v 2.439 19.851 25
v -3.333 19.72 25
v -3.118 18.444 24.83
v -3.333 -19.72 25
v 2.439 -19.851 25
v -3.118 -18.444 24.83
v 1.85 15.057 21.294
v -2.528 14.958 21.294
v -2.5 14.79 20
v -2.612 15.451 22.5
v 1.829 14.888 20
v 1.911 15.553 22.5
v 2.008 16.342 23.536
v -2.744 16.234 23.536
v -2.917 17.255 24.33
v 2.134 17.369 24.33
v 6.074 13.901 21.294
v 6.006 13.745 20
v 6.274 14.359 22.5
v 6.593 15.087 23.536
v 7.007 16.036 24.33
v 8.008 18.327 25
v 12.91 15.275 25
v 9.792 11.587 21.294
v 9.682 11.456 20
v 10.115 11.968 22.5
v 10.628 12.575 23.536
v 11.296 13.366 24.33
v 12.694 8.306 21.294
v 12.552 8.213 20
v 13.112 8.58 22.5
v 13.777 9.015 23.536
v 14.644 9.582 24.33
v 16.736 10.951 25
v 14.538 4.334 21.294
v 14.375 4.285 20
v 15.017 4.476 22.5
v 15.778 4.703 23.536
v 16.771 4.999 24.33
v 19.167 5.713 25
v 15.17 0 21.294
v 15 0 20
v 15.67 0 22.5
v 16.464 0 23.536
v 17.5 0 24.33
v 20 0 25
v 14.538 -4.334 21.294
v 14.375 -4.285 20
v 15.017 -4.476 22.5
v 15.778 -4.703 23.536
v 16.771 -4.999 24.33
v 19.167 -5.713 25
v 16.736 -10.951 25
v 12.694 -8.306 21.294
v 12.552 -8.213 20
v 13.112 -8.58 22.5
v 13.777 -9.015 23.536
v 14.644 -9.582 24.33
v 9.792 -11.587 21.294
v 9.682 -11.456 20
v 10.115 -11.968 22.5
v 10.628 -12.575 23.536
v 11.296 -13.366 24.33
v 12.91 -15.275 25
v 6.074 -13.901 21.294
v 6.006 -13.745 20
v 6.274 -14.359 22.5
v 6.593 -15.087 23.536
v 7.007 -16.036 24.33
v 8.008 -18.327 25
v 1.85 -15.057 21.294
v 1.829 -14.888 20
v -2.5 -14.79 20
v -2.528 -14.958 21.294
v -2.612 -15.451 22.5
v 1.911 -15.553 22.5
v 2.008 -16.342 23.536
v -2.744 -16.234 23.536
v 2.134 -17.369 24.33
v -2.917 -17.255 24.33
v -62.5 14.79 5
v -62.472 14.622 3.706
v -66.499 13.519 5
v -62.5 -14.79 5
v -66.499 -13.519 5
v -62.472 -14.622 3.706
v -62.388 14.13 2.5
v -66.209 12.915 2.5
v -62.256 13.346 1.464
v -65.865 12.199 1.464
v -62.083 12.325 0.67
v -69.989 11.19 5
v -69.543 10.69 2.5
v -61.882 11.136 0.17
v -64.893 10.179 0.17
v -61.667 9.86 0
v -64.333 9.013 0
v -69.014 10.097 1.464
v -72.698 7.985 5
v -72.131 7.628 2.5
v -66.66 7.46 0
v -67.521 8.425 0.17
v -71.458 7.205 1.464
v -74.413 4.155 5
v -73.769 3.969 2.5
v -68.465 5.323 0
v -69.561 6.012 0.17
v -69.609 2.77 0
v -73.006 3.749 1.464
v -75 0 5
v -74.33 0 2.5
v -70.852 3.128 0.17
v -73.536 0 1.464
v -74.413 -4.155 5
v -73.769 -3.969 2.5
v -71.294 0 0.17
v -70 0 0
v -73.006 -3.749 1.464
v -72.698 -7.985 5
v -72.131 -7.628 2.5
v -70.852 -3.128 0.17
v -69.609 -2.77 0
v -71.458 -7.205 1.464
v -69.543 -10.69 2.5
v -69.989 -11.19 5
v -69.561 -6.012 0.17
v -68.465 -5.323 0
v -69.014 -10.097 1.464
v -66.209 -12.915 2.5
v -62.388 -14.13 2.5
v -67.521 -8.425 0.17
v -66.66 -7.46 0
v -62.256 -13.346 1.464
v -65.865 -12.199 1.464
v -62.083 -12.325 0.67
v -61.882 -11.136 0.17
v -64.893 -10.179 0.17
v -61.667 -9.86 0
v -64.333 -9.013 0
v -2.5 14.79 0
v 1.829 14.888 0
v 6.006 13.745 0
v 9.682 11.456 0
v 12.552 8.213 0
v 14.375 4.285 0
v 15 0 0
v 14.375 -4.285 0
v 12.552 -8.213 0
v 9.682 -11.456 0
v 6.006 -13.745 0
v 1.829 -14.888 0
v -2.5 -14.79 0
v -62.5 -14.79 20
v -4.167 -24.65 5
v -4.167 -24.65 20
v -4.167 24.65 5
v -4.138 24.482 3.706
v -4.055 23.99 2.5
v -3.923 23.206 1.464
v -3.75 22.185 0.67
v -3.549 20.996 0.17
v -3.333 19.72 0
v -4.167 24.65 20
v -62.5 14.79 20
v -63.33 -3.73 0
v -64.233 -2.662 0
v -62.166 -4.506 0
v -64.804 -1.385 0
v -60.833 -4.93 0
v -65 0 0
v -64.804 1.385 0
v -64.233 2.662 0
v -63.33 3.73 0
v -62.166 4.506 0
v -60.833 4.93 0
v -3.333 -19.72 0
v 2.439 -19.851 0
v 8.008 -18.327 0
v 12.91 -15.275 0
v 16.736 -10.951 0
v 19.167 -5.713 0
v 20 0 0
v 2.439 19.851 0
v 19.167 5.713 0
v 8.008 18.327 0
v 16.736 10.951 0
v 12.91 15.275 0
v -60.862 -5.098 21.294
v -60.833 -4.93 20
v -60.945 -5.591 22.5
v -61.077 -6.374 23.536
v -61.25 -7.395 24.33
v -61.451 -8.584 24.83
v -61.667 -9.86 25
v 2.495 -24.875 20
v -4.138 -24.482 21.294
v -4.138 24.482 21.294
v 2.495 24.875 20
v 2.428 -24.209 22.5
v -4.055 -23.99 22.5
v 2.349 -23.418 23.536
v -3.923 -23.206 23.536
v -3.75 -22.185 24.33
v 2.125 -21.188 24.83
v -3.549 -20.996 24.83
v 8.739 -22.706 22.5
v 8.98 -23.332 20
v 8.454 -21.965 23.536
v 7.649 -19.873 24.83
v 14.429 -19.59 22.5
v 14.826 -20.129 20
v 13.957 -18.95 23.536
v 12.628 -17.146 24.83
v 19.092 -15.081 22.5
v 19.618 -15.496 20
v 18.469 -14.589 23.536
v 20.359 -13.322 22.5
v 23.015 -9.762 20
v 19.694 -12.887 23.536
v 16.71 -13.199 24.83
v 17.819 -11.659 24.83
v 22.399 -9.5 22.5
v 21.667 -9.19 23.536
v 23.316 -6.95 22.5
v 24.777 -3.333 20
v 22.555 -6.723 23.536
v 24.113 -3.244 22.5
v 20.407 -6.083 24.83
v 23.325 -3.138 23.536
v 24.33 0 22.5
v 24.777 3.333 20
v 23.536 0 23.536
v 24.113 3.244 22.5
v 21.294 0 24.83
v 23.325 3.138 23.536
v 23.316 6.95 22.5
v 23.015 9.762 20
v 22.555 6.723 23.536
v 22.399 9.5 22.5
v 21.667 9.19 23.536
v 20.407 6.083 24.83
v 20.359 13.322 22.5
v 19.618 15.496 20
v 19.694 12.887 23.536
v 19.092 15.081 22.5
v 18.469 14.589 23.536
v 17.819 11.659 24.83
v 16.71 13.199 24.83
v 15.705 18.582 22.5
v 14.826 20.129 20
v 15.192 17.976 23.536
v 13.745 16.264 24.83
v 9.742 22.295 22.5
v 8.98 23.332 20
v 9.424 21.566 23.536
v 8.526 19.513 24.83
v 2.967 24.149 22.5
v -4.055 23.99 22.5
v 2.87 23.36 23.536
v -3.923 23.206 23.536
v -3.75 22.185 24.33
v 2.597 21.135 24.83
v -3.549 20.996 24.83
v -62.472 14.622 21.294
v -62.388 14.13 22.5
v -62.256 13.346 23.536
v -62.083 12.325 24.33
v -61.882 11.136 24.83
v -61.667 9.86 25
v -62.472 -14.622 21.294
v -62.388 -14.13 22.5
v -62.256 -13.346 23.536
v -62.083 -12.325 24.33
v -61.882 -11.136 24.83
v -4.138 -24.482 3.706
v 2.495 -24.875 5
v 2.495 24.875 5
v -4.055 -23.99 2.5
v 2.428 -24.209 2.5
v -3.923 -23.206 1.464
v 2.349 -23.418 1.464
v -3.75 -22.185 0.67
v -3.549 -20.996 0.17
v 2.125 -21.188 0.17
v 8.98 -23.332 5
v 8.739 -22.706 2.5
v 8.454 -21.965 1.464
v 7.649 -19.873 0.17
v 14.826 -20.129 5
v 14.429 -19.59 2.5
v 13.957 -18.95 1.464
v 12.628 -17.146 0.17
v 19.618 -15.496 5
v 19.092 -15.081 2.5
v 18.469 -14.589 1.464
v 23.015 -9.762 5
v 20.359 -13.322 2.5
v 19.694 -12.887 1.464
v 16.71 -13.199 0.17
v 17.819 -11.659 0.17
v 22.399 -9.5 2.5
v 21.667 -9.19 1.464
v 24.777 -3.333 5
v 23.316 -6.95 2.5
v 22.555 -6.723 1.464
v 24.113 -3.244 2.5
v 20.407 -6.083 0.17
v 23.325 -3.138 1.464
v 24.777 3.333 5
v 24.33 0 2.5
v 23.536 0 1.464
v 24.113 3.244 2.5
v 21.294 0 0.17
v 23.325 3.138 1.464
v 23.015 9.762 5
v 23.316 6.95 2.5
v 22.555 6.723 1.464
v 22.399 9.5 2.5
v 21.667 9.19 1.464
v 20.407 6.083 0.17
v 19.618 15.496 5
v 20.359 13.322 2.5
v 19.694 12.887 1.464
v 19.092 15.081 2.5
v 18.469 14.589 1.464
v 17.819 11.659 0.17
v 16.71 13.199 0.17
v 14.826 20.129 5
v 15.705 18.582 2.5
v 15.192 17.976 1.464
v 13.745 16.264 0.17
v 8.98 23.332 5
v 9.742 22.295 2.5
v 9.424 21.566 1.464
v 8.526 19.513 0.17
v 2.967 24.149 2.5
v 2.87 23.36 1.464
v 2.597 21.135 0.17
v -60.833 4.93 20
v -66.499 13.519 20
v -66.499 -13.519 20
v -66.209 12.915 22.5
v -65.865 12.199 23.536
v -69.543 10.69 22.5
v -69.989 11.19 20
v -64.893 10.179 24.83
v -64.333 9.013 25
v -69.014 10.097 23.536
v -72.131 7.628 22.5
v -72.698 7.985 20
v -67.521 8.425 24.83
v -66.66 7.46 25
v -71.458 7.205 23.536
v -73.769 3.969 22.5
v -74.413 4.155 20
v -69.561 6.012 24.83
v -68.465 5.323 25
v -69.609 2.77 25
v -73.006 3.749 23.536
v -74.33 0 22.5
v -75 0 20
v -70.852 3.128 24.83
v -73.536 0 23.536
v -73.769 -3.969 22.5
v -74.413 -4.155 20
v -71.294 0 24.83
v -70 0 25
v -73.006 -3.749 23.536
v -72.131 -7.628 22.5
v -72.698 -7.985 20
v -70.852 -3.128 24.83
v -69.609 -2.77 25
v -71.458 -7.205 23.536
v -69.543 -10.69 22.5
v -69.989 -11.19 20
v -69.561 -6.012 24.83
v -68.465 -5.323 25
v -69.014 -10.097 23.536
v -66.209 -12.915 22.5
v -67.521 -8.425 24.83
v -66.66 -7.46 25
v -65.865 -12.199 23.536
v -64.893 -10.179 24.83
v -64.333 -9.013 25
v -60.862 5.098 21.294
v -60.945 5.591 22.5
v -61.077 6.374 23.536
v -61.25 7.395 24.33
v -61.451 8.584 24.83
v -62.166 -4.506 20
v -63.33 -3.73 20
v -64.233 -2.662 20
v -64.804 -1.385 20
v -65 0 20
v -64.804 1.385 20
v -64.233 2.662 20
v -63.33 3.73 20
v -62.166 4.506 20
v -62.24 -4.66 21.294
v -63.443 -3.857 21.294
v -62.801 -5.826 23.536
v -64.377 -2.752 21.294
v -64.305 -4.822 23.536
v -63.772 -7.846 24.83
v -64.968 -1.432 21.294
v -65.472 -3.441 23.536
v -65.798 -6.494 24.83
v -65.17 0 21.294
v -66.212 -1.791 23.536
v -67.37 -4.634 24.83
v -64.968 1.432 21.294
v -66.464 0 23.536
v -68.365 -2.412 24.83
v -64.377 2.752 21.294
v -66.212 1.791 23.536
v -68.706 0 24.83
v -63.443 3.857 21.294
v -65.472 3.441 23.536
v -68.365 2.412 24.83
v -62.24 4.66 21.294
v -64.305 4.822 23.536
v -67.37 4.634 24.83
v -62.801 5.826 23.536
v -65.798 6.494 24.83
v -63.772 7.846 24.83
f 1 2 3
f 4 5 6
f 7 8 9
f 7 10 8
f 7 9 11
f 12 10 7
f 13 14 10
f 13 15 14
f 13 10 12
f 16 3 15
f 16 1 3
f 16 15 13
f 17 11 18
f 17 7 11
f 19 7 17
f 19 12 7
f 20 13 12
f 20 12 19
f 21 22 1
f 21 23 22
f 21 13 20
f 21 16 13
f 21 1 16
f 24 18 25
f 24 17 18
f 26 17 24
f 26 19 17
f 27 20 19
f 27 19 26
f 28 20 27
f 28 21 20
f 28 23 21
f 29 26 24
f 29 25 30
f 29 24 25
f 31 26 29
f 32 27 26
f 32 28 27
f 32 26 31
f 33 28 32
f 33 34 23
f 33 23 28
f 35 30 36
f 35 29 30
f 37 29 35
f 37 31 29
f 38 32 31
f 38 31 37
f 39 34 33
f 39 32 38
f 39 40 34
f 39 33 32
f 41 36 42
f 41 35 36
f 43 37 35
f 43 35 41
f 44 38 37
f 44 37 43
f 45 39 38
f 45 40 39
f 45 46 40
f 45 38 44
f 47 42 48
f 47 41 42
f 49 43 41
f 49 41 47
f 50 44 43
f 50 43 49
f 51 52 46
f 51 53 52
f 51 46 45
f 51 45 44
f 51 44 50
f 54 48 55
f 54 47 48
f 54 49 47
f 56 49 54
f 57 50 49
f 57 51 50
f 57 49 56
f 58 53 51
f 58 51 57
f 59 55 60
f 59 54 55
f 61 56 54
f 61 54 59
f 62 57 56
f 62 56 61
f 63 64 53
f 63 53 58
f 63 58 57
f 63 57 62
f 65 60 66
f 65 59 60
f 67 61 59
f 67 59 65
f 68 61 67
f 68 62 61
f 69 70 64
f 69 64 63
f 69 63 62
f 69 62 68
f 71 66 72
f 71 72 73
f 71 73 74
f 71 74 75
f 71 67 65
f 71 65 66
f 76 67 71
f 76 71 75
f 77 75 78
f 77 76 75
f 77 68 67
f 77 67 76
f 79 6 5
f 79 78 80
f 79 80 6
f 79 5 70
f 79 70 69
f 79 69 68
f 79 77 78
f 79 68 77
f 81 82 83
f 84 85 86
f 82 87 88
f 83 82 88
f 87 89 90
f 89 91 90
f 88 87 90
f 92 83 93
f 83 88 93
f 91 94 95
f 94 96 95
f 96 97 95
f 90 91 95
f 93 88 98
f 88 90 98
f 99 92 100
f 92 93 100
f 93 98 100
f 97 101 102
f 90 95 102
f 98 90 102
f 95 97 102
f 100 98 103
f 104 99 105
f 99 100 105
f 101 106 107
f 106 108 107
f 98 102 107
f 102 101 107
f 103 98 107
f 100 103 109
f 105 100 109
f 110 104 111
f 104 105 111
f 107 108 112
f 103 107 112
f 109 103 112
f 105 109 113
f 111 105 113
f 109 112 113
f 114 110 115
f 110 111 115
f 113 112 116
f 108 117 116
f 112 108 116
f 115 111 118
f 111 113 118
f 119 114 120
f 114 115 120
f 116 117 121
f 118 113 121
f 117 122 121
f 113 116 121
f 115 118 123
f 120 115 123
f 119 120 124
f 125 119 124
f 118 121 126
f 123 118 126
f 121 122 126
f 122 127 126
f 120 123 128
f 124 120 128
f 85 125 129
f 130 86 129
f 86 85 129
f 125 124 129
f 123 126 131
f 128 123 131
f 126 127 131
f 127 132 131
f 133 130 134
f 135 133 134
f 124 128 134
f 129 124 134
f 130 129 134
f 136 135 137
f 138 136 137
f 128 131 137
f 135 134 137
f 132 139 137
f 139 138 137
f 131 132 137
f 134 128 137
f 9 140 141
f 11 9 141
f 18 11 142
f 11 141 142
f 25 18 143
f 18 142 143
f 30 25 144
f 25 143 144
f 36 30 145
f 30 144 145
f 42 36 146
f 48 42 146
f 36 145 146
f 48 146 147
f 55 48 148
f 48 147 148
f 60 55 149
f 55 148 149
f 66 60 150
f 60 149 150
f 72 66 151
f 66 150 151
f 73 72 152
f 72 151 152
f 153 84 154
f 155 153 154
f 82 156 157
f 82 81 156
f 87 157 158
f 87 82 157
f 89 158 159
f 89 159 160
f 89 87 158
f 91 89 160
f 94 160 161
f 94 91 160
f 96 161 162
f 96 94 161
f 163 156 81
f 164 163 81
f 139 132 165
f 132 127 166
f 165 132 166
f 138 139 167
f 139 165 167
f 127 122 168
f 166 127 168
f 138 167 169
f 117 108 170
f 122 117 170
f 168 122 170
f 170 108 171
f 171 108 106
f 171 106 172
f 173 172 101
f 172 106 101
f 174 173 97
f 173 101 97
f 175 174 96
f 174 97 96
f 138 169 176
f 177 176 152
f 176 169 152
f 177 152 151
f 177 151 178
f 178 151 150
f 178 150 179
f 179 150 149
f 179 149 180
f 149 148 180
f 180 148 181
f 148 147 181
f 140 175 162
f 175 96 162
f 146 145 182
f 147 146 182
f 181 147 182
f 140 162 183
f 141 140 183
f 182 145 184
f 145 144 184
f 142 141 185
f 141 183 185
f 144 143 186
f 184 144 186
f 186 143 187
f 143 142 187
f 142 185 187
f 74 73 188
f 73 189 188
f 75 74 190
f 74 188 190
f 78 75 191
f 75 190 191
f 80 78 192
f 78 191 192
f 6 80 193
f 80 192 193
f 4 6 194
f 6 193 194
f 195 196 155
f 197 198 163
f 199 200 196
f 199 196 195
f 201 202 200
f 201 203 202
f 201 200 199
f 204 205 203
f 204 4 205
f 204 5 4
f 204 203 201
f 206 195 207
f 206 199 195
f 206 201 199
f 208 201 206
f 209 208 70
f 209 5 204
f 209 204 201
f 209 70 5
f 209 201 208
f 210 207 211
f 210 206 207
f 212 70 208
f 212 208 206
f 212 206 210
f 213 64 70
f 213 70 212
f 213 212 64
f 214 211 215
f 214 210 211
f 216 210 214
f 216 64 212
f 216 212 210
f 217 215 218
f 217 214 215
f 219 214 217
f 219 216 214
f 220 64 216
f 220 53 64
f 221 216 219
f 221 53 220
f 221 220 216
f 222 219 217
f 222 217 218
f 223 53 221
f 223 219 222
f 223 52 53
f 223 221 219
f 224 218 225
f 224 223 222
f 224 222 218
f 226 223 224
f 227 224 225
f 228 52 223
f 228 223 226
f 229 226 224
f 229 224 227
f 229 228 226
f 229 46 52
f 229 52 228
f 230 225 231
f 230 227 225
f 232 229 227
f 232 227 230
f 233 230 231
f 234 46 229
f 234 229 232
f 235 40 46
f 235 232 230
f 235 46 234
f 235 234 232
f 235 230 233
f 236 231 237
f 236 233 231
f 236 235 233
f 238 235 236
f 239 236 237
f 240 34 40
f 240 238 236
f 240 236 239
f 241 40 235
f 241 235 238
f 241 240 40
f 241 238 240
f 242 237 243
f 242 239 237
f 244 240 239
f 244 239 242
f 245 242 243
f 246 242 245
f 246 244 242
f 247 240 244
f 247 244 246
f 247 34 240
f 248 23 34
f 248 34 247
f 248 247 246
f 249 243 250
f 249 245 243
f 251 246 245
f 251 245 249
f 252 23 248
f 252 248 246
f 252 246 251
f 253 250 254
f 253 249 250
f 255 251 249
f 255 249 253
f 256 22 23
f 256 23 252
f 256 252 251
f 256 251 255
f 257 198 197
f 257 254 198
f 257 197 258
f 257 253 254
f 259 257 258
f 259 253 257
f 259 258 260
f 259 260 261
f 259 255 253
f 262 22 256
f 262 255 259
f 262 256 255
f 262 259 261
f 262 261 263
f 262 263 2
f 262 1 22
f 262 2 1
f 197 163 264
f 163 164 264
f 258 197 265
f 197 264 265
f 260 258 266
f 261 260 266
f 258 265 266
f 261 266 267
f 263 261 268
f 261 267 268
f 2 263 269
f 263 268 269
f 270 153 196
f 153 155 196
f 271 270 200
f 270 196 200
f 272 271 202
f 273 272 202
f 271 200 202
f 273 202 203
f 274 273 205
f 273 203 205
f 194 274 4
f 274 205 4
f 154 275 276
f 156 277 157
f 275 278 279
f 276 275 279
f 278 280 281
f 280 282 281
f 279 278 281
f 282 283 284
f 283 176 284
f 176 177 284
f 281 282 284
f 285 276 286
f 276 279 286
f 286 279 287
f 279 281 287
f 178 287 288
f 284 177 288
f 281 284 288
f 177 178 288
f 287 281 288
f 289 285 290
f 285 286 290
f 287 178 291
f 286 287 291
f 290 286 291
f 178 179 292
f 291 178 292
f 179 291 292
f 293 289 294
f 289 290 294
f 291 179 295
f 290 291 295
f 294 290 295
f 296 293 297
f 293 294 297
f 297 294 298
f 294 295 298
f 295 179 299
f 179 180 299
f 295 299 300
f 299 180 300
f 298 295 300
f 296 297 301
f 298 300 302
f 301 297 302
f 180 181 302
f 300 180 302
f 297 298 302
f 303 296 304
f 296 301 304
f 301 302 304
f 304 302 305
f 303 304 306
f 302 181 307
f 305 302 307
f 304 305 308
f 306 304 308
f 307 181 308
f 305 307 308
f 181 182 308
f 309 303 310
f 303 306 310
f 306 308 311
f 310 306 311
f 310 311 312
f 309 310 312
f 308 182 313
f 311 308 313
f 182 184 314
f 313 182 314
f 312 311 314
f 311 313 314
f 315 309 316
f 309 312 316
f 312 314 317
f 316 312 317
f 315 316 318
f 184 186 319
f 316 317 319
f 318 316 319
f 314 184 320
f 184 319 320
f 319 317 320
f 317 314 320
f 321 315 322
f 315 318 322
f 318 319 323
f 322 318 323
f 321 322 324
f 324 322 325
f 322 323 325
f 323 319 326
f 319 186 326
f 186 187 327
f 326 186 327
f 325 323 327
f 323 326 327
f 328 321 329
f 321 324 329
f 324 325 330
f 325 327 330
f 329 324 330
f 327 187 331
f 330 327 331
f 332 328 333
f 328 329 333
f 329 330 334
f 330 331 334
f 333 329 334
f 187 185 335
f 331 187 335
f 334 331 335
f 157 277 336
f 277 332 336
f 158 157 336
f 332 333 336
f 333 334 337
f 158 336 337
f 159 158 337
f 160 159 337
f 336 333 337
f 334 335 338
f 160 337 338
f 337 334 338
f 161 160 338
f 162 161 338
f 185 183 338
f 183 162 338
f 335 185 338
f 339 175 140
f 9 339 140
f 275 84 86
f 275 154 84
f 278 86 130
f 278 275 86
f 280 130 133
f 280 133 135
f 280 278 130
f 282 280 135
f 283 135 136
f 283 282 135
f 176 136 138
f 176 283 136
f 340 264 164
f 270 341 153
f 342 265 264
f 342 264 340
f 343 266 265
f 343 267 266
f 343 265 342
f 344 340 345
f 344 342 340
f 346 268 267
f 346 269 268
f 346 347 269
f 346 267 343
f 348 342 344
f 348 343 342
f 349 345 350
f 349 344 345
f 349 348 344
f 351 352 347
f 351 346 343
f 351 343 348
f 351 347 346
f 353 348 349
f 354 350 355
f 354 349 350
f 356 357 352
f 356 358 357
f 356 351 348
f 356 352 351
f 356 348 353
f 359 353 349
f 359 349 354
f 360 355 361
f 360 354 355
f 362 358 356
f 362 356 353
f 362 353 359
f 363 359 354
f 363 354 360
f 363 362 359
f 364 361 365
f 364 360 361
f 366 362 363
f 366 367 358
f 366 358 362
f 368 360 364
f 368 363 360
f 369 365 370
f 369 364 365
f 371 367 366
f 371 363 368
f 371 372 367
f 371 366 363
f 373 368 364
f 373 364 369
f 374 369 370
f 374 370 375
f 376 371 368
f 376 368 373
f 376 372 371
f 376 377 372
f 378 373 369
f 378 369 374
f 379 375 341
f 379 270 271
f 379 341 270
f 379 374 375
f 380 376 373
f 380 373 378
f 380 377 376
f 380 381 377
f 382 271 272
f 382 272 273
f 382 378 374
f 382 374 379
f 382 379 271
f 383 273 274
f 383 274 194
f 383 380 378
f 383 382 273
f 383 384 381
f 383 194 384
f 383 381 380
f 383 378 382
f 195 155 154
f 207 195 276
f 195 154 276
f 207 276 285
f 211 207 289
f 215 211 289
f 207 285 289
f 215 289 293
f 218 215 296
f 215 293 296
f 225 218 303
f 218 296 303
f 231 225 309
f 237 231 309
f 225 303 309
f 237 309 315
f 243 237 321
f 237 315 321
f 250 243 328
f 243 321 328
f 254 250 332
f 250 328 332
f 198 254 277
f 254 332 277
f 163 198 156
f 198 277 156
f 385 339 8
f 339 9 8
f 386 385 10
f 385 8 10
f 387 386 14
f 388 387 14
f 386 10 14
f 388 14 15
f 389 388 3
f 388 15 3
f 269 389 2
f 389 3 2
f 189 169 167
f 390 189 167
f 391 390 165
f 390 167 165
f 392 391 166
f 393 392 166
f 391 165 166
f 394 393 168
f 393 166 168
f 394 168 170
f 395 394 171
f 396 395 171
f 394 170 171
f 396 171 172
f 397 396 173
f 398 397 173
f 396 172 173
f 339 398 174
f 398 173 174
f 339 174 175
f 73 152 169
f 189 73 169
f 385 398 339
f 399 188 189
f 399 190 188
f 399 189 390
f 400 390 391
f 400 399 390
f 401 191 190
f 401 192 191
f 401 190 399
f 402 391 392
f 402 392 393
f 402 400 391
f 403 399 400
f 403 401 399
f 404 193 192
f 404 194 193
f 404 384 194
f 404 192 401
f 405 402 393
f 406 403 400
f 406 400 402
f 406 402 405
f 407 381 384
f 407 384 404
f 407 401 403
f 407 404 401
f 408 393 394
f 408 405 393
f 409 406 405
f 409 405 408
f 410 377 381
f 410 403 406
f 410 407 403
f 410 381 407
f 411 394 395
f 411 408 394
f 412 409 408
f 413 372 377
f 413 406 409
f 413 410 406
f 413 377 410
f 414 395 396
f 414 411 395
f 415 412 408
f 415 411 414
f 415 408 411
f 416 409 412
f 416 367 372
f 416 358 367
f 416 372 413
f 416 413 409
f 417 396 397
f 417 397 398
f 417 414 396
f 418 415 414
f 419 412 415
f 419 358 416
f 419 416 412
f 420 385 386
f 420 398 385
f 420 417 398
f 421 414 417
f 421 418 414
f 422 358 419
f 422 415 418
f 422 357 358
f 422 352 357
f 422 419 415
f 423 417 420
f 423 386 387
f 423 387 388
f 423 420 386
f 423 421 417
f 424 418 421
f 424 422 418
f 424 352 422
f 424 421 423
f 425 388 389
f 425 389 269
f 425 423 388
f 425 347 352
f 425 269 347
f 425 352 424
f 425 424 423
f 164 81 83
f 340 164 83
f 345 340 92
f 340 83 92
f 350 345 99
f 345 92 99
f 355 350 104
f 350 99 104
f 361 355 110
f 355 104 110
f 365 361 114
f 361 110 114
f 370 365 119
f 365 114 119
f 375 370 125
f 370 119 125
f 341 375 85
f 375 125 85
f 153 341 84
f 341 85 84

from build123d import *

# Parameters (mm, degrees)
F1_DEPTH = 25
F2_R     = 4.99999


# Not quite as in the source:
# - a fillet or chamfer is up to 0.001 mm smaller than in the source, because OpenCascade refuses the exact size


with BuildPart() as f1:
    # F0 (on Top) → F1 (new body)
    with BuildSketch(Plane.XY):
        with BuildLine():
            Line((-4.1666666667, 24.6503324296), (-62.5, 14.7901994577))
            ThreePointArc((-62.5, 14.7901994577), (-75, 0), (-62.5, -14.7901994577))
            Line((-62.5, -14.7901994577), (-4.1666666667, -24.6503324296))
            ThreePointArc((-4.1666666667, -24.6503324296), (25, 0), (-4.1666666667, 24.6503324296))
        make_face()
        with BuildLine():
            ThreePointArc((-60.8333333333, -4.9300664859), (-65, 0), (-60.8333333333, 4.9300664859))
            Line((-60.8333333333, 4.9300664859), (-2.5, 14.7901994577))
            ThreePointArc((-2.5, 14.7901994577), (15, 0), (-2.5, -14.7901994577))
            Line((-2.5, -14.7901994577), (-60.8333333333, -4.9300664859))
        make_face(mode=Mode.SUBTRACT)
    extrude(amount=F1_DEPTH)

    # F2 (radius 5 in the source; OpenCascade refuses exactly that, so slightly less here)
    f2_edges = [f1.edges().sort_by_distance(p)[0] for p in [
        (25, 0, 25),
        (-33.333333, 19.720266, 25),
        (-75, 0, 25),
        (-33.333333, -19.720266, 25),
        (-31.666667, 9.860133, 25),
        (15, 0, 25),
        (-31.666667, -9.860133, 25),
        (-65, 0, 25),
        (-4.166667, -24.650332, 12.5),
        (-4.166667, 24.650332, 12.5),
        (25, 0, 0),
    ]]
    fillet(f2_edges, radius=F2_R)


solid = f1.part
